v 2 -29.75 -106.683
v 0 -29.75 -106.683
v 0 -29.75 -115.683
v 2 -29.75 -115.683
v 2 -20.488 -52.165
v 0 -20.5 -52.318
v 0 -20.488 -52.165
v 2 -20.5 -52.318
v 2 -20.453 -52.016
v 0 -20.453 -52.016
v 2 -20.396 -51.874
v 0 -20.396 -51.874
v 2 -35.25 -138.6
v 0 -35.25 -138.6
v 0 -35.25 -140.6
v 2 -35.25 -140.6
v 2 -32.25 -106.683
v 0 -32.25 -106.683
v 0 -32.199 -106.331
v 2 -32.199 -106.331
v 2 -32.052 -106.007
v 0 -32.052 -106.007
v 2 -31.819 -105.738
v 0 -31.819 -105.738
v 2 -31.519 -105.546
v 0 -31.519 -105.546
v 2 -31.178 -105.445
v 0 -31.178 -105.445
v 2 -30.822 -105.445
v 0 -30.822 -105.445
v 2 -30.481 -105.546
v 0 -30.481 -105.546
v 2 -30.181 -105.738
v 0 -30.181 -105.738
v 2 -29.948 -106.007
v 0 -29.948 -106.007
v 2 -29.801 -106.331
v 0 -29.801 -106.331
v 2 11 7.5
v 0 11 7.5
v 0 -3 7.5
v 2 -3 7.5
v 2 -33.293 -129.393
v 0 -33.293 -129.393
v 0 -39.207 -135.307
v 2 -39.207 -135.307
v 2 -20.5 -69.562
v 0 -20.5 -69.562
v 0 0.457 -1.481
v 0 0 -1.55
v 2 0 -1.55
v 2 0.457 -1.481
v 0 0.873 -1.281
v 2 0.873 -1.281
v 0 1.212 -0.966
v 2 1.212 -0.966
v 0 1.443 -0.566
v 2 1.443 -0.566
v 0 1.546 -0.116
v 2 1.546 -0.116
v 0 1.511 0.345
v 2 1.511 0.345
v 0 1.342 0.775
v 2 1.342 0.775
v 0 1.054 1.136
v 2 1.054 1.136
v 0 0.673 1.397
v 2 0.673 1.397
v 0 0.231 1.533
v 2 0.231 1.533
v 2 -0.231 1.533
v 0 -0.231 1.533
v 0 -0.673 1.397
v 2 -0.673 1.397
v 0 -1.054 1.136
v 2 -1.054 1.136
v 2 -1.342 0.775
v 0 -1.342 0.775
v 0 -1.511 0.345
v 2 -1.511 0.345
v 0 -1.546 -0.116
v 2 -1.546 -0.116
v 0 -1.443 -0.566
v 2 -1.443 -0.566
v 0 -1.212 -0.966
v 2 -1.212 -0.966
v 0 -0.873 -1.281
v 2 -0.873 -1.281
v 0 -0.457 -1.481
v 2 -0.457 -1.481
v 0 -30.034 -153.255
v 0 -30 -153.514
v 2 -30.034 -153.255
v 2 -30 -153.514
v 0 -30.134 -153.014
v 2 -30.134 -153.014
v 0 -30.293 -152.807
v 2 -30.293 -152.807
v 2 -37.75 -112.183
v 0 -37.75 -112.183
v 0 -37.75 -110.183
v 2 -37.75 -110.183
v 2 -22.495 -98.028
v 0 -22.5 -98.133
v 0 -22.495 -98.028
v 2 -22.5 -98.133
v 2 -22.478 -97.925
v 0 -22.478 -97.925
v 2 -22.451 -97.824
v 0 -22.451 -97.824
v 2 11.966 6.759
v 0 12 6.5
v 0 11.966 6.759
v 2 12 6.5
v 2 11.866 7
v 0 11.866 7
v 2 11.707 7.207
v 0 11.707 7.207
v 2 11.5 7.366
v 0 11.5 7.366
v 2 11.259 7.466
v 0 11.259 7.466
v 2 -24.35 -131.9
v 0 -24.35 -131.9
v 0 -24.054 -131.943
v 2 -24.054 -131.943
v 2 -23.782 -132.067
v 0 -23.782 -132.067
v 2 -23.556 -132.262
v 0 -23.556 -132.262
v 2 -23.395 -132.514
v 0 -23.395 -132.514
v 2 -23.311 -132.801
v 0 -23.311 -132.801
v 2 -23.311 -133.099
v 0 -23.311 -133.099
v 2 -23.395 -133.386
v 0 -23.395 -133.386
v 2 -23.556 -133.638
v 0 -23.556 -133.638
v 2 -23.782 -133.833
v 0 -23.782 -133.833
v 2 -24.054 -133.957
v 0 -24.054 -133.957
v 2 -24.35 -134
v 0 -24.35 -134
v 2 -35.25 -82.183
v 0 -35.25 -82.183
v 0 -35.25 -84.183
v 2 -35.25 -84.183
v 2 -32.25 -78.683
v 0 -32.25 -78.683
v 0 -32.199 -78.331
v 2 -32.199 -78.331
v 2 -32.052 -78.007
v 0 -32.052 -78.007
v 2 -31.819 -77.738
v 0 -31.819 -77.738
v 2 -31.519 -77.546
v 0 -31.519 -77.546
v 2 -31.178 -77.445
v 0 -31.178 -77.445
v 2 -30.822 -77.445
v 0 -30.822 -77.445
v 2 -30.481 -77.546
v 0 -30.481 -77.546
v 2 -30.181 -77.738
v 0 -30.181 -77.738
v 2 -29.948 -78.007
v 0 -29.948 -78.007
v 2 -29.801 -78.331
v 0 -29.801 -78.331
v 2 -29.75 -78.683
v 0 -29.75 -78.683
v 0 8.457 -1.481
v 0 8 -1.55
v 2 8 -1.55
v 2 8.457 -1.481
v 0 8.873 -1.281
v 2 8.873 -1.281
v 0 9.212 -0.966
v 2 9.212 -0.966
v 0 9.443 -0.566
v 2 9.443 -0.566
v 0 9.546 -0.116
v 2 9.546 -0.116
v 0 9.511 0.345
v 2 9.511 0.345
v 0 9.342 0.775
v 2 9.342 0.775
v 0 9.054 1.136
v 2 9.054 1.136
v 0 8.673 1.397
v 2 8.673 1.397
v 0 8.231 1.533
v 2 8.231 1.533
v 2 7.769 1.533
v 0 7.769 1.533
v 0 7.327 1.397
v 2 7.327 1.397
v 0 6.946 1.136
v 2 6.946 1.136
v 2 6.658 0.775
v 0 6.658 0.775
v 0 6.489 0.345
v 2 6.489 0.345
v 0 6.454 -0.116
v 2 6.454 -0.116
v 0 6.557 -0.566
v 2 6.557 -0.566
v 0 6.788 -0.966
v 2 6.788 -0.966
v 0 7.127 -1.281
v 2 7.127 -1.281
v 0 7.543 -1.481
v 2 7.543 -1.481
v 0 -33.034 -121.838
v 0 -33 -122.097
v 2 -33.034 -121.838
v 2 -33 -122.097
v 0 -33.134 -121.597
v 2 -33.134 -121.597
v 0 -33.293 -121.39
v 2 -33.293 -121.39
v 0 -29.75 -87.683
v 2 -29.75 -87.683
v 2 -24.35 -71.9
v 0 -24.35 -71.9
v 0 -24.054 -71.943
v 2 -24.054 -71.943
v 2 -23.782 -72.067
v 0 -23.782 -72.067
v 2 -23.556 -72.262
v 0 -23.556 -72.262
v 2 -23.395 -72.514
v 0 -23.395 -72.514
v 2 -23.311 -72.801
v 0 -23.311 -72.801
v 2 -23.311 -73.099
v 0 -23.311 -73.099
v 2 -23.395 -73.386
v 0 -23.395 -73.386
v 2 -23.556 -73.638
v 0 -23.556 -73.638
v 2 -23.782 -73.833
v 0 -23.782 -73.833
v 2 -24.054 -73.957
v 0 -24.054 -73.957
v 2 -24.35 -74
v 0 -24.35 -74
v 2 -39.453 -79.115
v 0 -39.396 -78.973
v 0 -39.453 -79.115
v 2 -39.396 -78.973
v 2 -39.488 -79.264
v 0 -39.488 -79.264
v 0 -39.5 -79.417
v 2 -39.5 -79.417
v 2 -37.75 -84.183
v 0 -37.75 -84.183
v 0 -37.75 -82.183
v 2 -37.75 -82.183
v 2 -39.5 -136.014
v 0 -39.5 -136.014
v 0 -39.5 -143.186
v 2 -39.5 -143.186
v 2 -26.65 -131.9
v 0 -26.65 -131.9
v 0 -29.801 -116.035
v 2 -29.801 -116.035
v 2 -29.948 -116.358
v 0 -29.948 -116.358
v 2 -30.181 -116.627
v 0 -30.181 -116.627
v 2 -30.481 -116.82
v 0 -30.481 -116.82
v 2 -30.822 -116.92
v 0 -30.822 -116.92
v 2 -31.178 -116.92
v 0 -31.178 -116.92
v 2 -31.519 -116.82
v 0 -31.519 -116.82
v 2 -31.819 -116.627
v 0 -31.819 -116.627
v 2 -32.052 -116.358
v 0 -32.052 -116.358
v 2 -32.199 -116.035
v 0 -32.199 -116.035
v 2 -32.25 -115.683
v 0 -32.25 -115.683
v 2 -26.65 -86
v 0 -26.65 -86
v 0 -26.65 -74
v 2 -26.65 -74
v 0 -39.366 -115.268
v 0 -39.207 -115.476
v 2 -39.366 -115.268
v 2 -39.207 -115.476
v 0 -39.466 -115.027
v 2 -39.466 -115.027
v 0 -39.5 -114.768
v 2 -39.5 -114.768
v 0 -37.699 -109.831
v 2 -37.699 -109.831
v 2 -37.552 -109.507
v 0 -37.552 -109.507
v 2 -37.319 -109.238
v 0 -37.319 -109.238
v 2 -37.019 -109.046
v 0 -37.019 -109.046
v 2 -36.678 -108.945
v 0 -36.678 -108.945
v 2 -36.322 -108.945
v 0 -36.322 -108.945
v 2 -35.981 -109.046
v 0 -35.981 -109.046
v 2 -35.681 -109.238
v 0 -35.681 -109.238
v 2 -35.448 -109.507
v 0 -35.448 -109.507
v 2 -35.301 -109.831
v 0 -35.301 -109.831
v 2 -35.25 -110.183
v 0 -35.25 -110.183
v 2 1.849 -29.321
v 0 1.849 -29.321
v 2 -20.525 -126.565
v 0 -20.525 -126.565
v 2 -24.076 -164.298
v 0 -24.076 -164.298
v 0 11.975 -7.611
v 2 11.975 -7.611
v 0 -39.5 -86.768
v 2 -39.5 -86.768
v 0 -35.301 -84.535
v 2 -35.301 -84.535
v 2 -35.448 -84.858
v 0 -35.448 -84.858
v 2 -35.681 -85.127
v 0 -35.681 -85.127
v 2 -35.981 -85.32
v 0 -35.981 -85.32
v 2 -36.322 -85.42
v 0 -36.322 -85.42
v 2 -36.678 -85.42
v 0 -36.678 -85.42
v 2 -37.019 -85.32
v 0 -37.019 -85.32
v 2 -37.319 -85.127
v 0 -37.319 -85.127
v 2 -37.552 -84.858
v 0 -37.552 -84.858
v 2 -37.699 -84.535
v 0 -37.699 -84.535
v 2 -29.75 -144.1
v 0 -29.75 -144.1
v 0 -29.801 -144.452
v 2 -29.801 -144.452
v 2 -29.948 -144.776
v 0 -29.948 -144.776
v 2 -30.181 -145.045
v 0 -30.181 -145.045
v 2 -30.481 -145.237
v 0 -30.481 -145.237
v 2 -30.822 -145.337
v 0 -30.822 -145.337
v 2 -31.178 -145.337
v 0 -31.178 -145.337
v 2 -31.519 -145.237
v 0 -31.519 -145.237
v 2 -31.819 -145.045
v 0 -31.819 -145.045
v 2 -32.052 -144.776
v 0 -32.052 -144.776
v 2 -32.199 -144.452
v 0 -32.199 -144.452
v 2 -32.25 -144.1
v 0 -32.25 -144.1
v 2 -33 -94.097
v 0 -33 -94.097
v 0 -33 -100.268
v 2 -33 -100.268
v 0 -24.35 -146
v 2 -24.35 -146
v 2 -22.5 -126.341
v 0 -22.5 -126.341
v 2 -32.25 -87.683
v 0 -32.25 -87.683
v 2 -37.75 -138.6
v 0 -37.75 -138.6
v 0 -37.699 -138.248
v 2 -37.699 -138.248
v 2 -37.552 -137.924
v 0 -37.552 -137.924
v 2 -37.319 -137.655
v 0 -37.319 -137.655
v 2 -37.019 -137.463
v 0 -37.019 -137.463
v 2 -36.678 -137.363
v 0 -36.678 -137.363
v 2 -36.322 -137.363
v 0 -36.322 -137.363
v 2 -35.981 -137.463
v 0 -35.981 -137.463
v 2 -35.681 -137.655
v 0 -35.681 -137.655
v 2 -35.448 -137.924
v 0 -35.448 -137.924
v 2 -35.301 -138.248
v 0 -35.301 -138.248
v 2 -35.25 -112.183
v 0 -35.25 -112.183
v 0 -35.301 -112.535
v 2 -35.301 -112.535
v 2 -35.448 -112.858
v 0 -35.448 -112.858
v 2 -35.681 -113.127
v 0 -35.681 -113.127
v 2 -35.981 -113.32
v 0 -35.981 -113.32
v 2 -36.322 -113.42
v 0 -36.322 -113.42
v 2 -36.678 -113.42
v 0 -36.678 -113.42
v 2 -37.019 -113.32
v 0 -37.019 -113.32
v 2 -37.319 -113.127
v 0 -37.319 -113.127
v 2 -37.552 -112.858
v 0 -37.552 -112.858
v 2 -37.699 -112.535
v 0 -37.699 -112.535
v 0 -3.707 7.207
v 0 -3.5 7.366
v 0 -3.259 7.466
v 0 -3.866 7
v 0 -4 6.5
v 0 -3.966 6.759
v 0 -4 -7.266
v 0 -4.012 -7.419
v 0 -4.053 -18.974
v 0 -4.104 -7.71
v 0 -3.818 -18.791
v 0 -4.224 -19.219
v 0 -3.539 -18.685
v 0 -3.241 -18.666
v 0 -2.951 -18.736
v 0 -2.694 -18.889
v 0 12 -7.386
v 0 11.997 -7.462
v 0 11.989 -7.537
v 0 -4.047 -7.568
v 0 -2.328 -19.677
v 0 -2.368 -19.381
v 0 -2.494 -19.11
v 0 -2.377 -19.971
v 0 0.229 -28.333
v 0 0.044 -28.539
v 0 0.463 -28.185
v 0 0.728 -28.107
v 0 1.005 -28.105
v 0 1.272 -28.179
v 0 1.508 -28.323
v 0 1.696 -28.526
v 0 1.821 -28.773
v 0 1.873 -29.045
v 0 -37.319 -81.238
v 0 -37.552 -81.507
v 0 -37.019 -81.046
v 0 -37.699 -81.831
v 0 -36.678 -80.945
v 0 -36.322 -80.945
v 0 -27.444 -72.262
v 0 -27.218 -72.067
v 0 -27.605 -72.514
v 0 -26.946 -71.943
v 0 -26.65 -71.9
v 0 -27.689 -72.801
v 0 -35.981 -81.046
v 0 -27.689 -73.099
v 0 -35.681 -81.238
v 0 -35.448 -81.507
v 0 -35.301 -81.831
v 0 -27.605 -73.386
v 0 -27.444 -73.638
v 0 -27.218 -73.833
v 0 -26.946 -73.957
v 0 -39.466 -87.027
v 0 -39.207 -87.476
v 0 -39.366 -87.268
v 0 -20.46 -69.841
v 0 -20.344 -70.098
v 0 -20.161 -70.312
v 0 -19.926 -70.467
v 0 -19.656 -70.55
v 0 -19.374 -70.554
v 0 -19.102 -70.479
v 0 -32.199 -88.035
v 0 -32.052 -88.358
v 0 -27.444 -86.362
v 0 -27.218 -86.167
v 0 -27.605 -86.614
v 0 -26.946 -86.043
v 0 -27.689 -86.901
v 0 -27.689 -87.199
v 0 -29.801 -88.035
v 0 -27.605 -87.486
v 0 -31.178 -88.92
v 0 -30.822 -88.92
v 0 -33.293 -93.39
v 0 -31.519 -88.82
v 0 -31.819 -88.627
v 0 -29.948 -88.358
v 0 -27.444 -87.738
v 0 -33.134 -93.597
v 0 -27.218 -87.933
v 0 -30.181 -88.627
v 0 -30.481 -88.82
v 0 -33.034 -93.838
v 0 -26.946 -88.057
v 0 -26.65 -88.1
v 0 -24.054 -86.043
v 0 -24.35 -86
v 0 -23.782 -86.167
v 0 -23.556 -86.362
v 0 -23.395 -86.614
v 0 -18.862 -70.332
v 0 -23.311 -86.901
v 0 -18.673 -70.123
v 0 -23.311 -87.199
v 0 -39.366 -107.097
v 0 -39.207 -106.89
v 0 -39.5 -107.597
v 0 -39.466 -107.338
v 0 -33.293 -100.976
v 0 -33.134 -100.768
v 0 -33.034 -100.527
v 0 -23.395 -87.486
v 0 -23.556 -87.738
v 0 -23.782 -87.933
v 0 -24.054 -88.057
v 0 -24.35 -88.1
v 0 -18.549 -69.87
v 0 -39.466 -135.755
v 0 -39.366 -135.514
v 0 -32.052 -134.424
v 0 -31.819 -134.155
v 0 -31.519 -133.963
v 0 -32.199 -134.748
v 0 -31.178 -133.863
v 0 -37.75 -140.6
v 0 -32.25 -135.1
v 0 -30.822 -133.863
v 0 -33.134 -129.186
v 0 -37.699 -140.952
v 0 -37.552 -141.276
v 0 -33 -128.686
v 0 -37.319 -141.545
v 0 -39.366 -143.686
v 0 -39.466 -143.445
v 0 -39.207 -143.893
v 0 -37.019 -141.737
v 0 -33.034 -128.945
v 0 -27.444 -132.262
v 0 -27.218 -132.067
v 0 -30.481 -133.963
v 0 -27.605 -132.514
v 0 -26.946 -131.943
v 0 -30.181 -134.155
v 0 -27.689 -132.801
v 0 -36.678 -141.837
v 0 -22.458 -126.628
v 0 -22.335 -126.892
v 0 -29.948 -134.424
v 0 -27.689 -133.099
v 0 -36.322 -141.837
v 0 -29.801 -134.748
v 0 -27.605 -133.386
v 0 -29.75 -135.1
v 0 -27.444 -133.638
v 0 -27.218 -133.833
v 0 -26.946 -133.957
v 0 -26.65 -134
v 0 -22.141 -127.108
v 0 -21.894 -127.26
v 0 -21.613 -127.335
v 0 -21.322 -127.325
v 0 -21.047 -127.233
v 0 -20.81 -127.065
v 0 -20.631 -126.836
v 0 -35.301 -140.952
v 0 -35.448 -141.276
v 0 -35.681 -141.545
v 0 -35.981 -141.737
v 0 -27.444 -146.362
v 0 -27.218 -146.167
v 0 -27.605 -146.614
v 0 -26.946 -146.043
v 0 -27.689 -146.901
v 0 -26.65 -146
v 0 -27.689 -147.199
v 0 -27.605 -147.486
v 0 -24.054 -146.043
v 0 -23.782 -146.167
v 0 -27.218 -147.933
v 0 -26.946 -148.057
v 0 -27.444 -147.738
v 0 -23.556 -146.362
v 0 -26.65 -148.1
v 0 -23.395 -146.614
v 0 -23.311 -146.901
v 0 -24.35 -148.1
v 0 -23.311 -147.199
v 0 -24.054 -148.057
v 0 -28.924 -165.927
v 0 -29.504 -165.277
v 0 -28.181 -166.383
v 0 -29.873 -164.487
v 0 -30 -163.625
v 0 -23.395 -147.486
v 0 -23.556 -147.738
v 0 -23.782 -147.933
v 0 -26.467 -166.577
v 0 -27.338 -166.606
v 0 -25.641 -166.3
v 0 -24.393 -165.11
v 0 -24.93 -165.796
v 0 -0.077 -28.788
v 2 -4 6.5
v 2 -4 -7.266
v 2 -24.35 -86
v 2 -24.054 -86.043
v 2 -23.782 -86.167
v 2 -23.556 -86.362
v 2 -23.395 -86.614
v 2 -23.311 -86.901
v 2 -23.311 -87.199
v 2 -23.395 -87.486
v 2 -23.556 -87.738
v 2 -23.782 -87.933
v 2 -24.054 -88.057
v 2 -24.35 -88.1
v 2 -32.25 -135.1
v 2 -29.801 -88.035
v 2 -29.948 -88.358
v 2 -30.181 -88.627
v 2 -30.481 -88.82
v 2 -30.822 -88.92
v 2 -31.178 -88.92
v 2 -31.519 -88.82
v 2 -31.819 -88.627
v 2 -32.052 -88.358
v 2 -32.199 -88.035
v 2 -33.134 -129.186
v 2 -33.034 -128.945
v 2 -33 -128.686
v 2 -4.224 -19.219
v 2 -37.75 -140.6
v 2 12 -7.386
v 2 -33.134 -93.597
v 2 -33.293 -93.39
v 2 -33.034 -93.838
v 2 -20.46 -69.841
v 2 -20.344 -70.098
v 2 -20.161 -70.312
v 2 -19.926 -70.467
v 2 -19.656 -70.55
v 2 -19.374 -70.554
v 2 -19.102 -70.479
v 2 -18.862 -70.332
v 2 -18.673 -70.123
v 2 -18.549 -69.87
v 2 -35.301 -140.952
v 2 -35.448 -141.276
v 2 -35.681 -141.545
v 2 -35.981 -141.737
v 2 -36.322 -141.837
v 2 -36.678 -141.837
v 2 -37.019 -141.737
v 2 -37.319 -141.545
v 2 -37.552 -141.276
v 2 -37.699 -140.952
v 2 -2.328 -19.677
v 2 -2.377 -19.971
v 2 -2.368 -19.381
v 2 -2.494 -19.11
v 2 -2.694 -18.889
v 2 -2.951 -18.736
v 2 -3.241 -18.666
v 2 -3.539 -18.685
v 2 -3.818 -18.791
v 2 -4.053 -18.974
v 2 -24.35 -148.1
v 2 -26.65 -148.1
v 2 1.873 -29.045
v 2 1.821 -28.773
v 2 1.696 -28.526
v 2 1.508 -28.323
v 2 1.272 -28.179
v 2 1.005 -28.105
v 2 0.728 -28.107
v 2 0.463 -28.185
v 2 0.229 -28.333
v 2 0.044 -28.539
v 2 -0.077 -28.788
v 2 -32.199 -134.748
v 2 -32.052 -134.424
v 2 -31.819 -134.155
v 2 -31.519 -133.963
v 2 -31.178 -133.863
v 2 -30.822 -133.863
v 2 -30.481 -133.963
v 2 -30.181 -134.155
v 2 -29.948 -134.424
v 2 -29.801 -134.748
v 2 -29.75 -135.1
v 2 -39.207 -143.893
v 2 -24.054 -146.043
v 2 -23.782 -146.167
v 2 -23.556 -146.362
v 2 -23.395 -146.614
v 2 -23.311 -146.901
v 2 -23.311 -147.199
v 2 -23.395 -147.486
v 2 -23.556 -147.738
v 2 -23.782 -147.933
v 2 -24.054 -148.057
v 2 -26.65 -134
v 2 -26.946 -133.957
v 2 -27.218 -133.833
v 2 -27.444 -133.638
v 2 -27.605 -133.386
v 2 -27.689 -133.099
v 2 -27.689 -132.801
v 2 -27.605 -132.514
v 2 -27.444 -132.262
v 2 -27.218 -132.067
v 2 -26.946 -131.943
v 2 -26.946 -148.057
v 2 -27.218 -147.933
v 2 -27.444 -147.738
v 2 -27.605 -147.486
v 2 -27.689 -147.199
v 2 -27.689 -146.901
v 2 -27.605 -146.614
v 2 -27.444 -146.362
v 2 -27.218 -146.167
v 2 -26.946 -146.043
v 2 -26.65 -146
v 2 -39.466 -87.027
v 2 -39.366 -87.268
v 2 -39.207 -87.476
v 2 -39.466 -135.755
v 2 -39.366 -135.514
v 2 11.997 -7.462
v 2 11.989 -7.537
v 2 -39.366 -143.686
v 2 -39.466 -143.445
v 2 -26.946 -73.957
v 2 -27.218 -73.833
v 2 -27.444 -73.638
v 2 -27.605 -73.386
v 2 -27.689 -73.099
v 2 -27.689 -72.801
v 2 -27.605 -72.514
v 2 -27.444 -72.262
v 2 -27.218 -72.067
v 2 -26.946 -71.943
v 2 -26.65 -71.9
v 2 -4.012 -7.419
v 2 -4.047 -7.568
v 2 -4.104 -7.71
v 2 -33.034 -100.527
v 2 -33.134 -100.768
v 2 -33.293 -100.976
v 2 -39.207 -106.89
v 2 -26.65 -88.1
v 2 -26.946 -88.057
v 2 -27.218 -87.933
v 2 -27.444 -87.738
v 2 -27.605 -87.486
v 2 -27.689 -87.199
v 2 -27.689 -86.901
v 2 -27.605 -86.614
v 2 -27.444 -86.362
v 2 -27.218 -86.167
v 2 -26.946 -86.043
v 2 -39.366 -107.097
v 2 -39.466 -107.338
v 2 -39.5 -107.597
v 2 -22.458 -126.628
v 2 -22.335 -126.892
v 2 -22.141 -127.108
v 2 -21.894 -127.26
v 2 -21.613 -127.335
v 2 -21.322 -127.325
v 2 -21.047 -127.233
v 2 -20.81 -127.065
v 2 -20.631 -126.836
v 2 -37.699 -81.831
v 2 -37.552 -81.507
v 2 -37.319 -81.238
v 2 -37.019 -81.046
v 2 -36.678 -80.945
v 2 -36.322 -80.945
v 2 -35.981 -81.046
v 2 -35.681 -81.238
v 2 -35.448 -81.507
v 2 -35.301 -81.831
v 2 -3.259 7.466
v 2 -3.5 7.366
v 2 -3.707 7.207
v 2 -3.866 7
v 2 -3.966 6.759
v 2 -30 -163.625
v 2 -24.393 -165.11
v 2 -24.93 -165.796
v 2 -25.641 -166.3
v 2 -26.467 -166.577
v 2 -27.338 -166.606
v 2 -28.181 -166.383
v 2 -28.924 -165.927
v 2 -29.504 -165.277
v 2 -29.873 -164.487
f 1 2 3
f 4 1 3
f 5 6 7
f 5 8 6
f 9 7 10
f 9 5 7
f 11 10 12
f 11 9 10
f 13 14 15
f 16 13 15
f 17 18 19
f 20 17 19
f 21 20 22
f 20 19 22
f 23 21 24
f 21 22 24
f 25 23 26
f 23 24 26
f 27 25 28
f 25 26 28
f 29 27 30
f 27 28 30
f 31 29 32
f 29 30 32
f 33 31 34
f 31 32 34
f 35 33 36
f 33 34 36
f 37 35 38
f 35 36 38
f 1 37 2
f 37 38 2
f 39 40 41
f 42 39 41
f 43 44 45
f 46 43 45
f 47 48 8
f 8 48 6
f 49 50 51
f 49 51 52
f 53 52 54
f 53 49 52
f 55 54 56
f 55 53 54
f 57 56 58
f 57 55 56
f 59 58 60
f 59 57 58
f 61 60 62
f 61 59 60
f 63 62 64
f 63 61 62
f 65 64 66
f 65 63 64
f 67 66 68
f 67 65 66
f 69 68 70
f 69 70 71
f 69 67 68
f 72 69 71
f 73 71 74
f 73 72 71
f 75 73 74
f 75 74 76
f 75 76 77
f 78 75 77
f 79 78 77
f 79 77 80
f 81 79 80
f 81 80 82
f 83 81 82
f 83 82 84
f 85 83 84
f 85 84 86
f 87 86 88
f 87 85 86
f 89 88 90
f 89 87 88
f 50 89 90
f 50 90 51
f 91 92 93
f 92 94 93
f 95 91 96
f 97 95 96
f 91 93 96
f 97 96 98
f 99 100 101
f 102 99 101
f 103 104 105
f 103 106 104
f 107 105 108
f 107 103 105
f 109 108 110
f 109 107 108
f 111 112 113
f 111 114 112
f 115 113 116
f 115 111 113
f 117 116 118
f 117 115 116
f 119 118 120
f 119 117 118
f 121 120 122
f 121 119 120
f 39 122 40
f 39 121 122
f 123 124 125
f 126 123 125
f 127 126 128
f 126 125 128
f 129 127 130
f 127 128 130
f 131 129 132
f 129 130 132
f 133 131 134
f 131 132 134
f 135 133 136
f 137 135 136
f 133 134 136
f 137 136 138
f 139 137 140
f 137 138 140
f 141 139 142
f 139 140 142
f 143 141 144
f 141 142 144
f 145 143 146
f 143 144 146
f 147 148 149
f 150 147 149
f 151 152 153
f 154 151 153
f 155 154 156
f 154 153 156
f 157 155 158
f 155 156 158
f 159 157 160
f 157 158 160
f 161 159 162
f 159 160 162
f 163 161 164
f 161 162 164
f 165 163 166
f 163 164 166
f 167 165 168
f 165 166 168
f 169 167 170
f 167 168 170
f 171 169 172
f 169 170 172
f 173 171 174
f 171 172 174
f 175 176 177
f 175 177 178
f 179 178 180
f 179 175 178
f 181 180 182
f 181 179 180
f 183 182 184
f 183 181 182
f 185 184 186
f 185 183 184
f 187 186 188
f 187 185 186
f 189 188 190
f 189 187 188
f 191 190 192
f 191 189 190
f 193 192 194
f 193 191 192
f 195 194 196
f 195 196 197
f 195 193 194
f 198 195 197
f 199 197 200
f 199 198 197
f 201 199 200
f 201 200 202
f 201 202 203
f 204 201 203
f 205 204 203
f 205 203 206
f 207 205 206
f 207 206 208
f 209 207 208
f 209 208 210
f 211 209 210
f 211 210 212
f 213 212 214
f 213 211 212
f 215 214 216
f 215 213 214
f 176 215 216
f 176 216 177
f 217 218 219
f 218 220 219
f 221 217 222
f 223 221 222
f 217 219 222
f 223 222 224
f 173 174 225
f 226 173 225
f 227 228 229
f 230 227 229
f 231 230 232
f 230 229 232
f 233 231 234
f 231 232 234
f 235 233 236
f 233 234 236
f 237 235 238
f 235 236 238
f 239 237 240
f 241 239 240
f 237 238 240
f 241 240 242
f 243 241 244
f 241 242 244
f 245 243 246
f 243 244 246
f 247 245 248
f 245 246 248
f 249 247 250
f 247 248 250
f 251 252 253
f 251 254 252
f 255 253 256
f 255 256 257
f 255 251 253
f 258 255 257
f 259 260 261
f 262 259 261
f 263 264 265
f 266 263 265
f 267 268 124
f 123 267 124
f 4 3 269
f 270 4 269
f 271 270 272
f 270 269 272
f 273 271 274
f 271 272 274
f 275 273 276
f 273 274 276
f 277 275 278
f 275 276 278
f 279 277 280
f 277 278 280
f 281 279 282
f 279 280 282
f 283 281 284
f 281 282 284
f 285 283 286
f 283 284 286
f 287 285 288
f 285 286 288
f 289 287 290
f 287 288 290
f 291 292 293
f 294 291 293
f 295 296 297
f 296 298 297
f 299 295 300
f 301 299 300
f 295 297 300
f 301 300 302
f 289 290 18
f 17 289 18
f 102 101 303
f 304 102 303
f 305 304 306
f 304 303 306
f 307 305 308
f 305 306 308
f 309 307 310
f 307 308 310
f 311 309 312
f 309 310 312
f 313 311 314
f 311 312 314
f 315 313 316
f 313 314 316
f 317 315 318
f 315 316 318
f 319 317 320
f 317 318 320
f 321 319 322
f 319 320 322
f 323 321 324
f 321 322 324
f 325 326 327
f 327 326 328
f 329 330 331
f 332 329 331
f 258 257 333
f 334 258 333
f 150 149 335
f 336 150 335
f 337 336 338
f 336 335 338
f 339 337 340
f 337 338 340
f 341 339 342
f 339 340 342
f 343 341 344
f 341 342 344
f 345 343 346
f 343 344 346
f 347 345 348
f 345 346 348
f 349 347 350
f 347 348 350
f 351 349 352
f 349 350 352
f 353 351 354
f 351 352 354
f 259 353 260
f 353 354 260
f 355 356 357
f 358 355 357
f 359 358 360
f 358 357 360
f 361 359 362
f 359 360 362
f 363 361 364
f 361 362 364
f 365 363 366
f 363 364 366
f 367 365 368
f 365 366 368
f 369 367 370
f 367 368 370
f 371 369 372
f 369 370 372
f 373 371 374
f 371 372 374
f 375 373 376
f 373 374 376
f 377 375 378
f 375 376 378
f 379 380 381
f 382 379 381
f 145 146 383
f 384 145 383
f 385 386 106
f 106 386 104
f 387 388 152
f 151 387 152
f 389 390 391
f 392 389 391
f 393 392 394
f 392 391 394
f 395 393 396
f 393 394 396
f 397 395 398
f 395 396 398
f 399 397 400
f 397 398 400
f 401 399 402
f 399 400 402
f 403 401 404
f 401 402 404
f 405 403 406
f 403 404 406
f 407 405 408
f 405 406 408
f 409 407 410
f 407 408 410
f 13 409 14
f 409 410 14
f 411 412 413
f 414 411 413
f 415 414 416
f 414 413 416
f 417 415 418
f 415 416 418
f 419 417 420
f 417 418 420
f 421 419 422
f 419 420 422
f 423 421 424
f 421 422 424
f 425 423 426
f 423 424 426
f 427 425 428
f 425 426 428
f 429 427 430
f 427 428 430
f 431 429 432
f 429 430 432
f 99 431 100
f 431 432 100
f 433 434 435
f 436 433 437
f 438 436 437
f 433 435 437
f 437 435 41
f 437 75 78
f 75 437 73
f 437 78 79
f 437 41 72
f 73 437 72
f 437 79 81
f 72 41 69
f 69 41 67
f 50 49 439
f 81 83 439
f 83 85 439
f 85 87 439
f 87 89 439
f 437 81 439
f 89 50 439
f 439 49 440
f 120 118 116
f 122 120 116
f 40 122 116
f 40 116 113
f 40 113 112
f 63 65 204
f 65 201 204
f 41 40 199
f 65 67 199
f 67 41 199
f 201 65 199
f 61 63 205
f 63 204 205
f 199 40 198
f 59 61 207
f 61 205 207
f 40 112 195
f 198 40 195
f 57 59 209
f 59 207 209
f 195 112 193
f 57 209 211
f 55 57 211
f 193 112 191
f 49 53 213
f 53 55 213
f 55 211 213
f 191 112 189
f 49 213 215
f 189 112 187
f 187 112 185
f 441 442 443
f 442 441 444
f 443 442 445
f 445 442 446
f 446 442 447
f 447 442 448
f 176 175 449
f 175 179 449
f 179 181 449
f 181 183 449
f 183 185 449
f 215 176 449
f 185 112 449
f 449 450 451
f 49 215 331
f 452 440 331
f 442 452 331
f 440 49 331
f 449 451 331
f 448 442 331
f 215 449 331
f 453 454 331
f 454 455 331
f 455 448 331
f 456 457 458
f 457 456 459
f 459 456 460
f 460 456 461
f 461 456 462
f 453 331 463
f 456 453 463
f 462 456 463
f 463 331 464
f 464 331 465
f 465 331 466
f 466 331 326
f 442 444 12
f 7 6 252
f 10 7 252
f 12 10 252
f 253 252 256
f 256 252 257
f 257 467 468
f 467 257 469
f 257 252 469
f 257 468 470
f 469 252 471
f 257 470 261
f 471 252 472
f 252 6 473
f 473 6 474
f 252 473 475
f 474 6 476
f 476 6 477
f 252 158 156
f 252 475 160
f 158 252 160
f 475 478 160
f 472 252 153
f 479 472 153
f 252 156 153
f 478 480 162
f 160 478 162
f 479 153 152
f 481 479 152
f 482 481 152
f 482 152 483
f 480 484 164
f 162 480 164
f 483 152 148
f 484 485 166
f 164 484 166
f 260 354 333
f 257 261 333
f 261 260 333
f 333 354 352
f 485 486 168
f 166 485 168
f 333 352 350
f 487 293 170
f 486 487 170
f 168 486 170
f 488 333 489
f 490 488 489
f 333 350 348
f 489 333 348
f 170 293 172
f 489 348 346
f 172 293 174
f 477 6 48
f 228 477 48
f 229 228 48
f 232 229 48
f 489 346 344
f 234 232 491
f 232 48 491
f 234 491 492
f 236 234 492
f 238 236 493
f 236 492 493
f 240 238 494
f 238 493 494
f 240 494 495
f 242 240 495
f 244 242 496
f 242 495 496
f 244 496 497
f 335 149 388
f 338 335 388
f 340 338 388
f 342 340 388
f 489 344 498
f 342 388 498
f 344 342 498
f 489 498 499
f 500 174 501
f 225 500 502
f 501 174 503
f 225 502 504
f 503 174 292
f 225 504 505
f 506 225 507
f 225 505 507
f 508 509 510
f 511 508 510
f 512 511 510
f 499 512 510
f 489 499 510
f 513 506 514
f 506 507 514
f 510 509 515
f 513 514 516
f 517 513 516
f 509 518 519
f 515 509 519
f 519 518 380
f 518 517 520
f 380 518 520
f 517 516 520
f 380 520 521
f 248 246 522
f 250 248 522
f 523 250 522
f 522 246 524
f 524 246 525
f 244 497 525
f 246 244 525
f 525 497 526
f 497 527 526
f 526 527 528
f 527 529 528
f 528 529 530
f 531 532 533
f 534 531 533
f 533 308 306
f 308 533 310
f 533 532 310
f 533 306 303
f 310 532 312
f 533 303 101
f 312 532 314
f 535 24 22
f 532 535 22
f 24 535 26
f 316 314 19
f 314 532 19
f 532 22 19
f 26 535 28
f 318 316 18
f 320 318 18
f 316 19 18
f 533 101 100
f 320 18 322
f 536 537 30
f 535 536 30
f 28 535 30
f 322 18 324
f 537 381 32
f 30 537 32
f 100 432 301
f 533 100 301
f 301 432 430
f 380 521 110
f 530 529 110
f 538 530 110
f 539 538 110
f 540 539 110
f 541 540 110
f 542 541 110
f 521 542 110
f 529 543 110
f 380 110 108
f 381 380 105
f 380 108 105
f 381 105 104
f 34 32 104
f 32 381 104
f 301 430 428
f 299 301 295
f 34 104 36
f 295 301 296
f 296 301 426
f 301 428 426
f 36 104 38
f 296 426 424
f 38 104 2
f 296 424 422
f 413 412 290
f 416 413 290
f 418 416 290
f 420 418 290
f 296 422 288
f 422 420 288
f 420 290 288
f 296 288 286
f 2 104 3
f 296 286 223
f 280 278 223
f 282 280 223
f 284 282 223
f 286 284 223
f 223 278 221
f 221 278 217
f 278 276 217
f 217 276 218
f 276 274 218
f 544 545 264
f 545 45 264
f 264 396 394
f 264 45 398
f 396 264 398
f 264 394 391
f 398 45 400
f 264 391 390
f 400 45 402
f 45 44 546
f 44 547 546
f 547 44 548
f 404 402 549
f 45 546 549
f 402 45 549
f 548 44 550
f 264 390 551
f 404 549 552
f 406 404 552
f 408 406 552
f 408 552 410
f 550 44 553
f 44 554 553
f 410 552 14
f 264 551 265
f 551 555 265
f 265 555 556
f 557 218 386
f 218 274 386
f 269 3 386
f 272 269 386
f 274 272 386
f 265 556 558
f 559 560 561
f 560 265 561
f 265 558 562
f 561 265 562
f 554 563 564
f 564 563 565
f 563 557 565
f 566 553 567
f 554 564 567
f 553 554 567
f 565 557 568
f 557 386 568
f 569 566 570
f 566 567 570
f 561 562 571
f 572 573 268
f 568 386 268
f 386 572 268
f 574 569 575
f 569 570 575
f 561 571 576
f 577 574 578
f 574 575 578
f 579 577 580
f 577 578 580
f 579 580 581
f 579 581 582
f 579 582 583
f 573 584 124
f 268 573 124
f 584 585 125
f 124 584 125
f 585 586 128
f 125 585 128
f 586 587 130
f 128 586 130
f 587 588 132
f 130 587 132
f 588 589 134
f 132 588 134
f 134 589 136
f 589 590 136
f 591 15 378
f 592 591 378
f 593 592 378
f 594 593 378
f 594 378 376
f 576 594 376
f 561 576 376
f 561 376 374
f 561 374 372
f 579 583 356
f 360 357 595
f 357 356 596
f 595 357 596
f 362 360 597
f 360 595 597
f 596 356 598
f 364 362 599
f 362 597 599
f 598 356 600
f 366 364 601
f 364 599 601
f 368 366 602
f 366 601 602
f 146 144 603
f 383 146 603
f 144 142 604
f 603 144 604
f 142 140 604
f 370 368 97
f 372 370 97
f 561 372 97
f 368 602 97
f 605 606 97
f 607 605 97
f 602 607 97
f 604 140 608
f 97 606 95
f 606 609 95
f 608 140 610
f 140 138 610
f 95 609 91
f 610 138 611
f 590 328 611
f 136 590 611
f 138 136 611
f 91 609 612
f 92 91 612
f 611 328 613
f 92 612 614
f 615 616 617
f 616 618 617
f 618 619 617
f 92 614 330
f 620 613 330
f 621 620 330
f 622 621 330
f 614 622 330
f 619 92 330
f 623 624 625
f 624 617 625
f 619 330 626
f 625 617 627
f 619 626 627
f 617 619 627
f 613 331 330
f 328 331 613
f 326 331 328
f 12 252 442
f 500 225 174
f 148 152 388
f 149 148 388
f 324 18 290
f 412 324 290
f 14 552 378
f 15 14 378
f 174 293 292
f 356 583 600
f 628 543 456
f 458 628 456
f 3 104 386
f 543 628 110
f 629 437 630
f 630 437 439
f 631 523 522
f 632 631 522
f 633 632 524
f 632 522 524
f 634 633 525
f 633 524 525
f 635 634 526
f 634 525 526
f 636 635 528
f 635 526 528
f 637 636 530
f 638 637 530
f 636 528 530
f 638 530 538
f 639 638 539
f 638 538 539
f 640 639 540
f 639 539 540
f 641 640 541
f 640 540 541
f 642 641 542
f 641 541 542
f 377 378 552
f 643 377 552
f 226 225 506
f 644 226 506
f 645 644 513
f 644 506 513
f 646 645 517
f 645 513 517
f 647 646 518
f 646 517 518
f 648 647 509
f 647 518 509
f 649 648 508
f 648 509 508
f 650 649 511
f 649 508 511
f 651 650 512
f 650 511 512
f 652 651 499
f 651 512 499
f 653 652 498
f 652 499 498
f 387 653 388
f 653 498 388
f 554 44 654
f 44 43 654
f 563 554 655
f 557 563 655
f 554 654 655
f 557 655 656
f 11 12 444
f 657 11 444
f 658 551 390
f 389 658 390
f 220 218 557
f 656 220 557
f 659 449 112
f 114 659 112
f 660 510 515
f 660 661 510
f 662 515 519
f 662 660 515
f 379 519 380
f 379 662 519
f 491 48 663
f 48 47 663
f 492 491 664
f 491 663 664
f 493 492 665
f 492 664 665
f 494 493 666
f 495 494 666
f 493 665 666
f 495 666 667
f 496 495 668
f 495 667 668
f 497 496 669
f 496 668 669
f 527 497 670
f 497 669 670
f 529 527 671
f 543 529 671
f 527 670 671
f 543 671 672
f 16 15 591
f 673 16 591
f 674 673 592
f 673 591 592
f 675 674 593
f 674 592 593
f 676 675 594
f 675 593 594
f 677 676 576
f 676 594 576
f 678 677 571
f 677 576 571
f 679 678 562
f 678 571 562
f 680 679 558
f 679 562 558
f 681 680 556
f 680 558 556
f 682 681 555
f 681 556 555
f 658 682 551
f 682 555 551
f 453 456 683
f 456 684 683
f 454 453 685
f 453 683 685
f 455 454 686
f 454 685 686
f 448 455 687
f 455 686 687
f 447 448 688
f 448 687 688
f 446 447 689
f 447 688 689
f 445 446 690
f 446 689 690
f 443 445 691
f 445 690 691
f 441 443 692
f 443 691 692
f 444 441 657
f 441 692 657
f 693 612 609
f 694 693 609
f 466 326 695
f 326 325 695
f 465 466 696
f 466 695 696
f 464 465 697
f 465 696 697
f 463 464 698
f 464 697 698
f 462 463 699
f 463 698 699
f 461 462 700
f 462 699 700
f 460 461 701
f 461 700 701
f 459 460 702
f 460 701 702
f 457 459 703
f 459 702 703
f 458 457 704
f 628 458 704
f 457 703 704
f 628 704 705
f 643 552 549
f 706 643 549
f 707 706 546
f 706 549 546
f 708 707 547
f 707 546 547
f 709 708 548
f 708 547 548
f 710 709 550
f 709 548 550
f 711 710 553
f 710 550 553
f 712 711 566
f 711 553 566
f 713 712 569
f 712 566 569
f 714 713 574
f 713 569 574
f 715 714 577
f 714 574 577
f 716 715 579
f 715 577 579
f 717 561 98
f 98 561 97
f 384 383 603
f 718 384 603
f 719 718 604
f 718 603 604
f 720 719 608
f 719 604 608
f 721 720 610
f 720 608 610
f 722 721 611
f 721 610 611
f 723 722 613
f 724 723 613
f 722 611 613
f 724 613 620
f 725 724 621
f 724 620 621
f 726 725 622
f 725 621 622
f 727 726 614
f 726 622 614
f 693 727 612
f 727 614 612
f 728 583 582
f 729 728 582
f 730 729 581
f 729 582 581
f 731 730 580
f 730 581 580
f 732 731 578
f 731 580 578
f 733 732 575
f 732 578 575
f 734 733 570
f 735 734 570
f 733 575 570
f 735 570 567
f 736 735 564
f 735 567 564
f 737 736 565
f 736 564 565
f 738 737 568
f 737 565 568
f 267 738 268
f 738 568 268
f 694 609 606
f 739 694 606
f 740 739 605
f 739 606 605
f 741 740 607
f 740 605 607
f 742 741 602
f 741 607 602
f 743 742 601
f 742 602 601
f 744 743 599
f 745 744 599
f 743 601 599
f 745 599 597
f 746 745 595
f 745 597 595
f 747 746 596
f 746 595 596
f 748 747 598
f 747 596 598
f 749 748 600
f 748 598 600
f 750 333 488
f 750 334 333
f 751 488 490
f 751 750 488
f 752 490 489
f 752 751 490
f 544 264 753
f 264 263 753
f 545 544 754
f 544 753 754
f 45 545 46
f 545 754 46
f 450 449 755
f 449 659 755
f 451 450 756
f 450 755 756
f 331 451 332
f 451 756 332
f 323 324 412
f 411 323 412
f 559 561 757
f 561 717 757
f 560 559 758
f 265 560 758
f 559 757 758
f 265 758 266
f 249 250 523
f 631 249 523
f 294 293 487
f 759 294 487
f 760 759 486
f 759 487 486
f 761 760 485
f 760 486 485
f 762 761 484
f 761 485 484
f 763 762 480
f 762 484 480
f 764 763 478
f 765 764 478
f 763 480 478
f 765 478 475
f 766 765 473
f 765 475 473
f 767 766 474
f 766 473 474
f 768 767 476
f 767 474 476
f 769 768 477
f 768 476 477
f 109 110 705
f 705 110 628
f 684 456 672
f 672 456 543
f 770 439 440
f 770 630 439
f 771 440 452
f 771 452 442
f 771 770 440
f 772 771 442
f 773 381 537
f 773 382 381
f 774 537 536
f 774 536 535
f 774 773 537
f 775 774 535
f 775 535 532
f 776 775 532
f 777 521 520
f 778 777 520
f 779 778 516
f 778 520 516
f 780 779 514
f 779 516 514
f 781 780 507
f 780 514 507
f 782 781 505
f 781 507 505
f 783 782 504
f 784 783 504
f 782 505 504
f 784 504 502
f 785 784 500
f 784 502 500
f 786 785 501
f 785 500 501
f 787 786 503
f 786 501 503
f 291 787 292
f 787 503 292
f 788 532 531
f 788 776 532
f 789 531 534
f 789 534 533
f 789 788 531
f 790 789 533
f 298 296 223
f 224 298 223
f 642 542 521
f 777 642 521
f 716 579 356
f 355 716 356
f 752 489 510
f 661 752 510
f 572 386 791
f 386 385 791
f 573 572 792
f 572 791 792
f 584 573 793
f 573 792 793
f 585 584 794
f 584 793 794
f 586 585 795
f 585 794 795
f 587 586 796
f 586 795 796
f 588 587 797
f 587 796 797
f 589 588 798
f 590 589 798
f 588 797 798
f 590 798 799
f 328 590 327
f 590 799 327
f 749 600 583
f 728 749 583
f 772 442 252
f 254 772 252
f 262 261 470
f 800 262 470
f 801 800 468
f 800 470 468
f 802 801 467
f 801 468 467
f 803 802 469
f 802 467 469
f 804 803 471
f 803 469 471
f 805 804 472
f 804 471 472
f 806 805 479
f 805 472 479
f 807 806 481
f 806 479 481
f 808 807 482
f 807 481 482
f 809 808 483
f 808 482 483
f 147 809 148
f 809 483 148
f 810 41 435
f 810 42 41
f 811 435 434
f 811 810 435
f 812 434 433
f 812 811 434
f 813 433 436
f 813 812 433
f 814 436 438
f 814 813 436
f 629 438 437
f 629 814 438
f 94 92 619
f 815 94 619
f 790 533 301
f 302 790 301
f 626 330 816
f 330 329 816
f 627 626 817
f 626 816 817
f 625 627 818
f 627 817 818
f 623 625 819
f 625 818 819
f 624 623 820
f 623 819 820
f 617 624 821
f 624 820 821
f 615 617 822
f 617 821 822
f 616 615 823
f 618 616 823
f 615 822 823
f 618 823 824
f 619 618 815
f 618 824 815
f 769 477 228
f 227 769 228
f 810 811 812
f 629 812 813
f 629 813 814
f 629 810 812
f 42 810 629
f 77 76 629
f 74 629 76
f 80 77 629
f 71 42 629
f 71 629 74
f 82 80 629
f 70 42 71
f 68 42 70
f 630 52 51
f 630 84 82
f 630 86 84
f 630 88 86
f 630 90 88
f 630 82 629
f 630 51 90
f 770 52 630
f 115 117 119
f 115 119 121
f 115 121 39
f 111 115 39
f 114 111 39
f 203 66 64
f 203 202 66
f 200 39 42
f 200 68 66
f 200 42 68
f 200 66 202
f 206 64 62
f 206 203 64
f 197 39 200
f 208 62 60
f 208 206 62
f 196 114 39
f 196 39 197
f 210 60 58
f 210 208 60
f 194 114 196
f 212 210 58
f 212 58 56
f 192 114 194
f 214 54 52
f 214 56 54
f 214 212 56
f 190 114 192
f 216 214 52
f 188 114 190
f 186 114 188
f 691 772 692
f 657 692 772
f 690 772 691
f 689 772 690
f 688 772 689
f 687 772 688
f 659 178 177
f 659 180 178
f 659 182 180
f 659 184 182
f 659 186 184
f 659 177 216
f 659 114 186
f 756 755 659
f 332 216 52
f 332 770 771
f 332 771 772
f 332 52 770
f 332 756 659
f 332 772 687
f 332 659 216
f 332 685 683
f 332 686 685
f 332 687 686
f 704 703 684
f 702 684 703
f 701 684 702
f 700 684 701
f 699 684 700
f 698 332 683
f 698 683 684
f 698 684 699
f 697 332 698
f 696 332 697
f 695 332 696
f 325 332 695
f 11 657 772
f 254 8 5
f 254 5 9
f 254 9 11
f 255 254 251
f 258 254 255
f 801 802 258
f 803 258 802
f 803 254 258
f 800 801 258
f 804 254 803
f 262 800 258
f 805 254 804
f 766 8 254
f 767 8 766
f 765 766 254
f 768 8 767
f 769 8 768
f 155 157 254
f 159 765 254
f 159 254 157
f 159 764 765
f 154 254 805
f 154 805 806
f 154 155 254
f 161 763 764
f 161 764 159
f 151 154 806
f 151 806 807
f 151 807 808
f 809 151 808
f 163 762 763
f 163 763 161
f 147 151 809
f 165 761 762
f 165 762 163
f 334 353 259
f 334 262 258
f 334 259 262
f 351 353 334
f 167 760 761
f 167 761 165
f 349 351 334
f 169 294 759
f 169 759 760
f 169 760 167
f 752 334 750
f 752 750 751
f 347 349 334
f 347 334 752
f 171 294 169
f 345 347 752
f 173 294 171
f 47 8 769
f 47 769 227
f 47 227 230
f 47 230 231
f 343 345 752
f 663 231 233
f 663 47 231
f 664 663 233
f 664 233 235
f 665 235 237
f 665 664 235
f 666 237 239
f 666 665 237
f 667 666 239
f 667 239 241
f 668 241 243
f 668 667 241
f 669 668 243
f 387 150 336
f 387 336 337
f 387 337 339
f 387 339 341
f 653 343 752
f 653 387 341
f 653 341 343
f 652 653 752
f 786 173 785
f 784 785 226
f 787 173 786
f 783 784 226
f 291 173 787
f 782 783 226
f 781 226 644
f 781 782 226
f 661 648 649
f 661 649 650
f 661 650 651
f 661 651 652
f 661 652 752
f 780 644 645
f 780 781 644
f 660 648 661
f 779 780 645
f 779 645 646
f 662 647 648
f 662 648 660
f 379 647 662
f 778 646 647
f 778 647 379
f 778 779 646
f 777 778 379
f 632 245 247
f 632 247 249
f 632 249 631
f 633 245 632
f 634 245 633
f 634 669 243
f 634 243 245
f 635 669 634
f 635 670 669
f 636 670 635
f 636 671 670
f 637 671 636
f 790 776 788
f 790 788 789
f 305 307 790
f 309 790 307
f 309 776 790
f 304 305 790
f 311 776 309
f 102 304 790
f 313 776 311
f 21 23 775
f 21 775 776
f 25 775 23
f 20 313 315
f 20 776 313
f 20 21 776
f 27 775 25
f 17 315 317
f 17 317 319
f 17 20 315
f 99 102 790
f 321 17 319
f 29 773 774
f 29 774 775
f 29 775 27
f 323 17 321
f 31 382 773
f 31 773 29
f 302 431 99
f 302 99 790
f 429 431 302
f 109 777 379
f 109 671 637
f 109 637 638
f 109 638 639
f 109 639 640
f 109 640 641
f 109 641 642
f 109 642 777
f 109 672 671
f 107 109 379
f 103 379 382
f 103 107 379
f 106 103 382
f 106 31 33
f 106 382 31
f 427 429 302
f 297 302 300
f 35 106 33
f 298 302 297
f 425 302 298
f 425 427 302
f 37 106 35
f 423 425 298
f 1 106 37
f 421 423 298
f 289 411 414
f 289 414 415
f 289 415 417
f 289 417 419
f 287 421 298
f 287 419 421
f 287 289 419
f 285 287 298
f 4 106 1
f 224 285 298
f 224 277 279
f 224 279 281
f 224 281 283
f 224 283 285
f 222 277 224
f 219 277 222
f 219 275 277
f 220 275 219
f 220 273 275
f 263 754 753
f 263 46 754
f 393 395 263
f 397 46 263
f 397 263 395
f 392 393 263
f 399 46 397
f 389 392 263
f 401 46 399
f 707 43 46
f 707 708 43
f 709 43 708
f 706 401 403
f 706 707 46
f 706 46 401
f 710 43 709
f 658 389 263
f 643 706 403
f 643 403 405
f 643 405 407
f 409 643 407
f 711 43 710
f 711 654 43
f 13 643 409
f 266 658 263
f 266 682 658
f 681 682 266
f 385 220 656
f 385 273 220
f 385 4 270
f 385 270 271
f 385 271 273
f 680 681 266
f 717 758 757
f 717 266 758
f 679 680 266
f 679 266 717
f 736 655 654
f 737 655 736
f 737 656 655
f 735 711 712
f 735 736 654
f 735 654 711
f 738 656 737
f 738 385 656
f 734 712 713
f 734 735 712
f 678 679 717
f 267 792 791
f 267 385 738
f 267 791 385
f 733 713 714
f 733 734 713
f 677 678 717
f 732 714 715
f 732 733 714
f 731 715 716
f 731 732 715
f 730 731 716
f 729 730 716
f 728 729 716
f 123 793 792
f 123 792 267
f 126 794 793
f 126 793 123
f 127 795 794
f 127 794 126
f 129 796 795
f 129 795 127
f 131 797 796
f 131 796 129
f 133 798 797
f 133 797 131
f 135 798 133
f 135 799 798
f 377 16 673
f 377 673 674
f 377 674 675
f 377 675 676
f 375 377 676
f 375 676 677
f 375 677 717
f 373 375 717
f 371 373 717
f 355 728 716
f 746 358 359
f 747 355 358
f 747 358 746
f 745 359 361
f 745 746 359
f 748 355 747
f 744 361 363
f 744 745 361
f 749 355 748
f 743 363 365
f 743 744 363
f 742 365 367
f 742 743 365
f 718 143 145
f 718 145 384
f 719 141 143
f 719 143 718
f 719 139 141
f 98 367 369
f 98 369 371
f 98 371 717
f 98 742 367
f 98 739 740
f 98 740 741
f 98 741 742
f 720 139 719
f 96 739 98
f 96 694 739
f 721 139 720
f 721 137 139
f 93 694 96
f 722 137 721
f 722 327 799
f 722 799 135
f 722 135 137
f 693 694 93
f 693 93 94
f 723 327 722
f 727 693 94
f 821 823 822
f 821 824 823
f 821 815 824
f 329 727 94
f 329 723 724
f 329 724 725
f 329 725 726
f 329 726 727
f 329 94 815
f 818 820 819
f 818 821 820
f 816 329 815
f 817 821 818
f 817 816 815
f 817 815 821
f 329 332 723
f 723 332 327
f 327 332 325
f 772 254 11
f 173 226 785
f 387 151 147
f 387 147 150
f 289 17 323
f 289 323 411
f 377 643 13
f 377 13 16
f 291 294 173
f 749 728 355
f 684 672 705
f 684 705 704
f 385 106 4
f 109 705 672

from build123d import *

# Parameters (mm, degrees)
SKETCH_1_R      = 1.55
EXTRUDE_1_DEPTH = 2
FILLET_1_R      = 1
FILLET_2_R      = 3


with BuildPart() as part:
    # 草图1 → 凸台-拉伸1 (new body)
    with BuildSketch(Plane(origin=(0, 0, 0), x_dir=(0, 0, -1), z_dir=(1, 0, 0))):
        Polygon((7.5, 12), (-7.5, 12), (-7.5, -4), (7.5, -4), (79.182692308, -39.5), (87.182692308, -39.5), (93.682692308, -33), (100.682692308, -33), (107.182692308, -39.5), (115.182692308, -39.5), (121.682692308, -33), (129.1, -33), (135.6, -39.5), (143.6, -39.5), (153.1, -30), (190.043283582, -30), align=None)
        with BuildLine():
            Line((78.682692308, -29.75), (87.682692308, -29.75))
            ThreePointArc((87.682692308, -29.75), (88.932692308, -31), (87.682692308, -32.25))
            Line((87.682692308, -32.25), (78.682692308, -32.25))
            ThreePointArc((78.682692308, -32.25), (77.432692308, -31), (78.682692308, -29.75))
        make_face(mode=Mode.SUBTRACT)
        with BuildLine():
            Line((106.682692308, -29.75), (115.682692308, -29.75))
            ThreePointArc((115.682692308, -29.75), (116.932692308, -31), (115.682692308, -32.25))
            Line((115.682692308, -32.25), (106.682692308, -32.25))
            ThreePointArc((106.682692308, -32.25), (105.432692308, -31), (106.682692308, -29.75))
        make_face(mode=Mode.SUBTRACT)
        with BuildLine():
            Line((135.1, -29.75), (144.1, -29.75))
            ThreePointArc((144.1, -29.75), (145.35, -31), (144.1, -32.25))
            Line((144.1, -32.25), (135.1, -32.25))
            ThreePointArc((135.1, -32.25), (133.85, -31), (135.1, -29.75))
        make_face(mode=Mode.SUBTRACT)
        with BuildLine():
            Line((86, -26.65), (74, -26.65))
            ThreePointArc((74, -26.65), (72.95, -27.7), (71.9, -26.65))
            Line((71.9, -26.65), (71.9, -24.35))
            ThreePointArc((71.9, -24.35), (72.95, -23.3), (74, -24.35))
            Line((74, -24.35), (86, -24.35))
            ThreePointArc((86, -24.35), (87.05, -23.3), (88.1, -24.35))
            Line((88.1, -24.35), (88.1, -26.65))
            ThreePointArc((88.1, -26.65), (87.05, -27.7), (86, -26.65))
        make_face(mode=Mode.SUBTRACT)
        with BuildLine():
            Line((146, -26.65), (134, -26.65))
            ThreePointArc((134, -26.65), (132.95, -27.7), (131.9, -26.65))
            Line((131.9, -26.65), (131.9, -24.35))
            ThreePointArc((131.9, -24.35), (132.95, -23.3), (134, -24.35))
            Line((134, -24.35), (146, -24.35))
            ThreePointArc((146, -24.35), (147.05, -23.3), (148.1, -24.35))
            Line((148.1, -24.35), (148.1, -26.65))
            ThreePointArc((148.1, -26.65), (147.05, -27.7), (146, -26.65))
        make_face(mode=Mode.SUBTRACT)
        Polygon((52.083732258, -20.5), (7, 1.827181689), (75.890858402, -20.5), align=None, mode=Mode.SUBTRACT)
        Polygon((97.974573659, -22.5), (7, 6.984403045), (135.147136815, -22.5), align=None, mode=Mode.SUBTRACT)
        Circle(SKETCH_1_R, mode=Mode.SUBTRACT)
        with Locations((0, 8)):
            Circle(SKETCH_1_R, mode=Mode.SUBTRACT)
        with BuildLine():
            Line((138.6, -35.25), (140.6, -35.25))
            ThreePointArc((140.6, -35.25), (141.85, -36.5), (140.6, -37.75))
            Line((140.6, -37.75), (138.6, -37.75))
            ThreePointArc((138.6, -37.75), (137.35, -36.5), (138.6, -35.25))
        make_face(mode=Mode.SUBTRACT)
        with BuildLine():
            ThreePointArc((82.182692308, -37.75), (80.932692308, -36.5), (82.182692308, -35.25))
            Line((82.182692308, -35.25), (84.182692308, -35.25))
            ThreePointArc((84.182692308, -35.25), (85.432692308, -36.5), (84.182692308, -37.75))
            Line((84.182692308, -37.75), (82.182692308, -37.75))
        make_face(mode=Mode.SUBTRACT)
        with BuildLine():
            ThreePointArc((110.182692308, -37.75), (108.932692308, -36.5), (110.182692308, -35.25))
            Line((110.182692308, -35.25), (112.182692308, -35.25))
            ThreePointArc((112.182692308, -35.25), (113.432692308, -36.5), (112.182692308, -37.75))
            Line((112.182692308, -37.75), (110.182692308, -37.75))
        make_face(mode=Mode.SUBTRACT)
    extrude(amount=EXTRUDE_1_DEPTH)

    # 圆角1
    fillet_1_edges = [part.edges().sort_by_distance(p)[0] for p in [
        (1, -33, -121.682692308),
        (1, -39.5, -115.182692308),
        (1, -39.5, -107.182692308),
        (1, -33, -100.682692308),
        (1, -33, -93.682692308),
        (1, -39.5, -87.182692308),
        (1, -39.5, -79.182692308),
        (1, -4, -7.5),
        (1, -4, 7.5),
        (1, 12, 7.5),
        (1, 12, -7.5),
        (1, -30, -153.1),
        (1, -39.5, -143.6),
        (1, -39.5, -135.6),
        (1, -33, -129.1),
        (1, 6.984403045, -7),
        (1, -22.5, -97.974573659),
        (1, -22.5, -135.147136815),
        (1, 1.827181689, -7),
        (1, -20.5, -52.083732258),
        (1, -20.5, -75.890858402),
    ]]
    fillet(fillet_1_edges, radius=FILLET_1_R)

    # 圆角2
    fillet_2_edges = [part.edges().sort_by_distance(p)[0] for p in [
        (1, -30, -190.043283582),
    ]]
    fillet(fillet_2_edges, radius=FILLET_2_R)


solid = part.part
